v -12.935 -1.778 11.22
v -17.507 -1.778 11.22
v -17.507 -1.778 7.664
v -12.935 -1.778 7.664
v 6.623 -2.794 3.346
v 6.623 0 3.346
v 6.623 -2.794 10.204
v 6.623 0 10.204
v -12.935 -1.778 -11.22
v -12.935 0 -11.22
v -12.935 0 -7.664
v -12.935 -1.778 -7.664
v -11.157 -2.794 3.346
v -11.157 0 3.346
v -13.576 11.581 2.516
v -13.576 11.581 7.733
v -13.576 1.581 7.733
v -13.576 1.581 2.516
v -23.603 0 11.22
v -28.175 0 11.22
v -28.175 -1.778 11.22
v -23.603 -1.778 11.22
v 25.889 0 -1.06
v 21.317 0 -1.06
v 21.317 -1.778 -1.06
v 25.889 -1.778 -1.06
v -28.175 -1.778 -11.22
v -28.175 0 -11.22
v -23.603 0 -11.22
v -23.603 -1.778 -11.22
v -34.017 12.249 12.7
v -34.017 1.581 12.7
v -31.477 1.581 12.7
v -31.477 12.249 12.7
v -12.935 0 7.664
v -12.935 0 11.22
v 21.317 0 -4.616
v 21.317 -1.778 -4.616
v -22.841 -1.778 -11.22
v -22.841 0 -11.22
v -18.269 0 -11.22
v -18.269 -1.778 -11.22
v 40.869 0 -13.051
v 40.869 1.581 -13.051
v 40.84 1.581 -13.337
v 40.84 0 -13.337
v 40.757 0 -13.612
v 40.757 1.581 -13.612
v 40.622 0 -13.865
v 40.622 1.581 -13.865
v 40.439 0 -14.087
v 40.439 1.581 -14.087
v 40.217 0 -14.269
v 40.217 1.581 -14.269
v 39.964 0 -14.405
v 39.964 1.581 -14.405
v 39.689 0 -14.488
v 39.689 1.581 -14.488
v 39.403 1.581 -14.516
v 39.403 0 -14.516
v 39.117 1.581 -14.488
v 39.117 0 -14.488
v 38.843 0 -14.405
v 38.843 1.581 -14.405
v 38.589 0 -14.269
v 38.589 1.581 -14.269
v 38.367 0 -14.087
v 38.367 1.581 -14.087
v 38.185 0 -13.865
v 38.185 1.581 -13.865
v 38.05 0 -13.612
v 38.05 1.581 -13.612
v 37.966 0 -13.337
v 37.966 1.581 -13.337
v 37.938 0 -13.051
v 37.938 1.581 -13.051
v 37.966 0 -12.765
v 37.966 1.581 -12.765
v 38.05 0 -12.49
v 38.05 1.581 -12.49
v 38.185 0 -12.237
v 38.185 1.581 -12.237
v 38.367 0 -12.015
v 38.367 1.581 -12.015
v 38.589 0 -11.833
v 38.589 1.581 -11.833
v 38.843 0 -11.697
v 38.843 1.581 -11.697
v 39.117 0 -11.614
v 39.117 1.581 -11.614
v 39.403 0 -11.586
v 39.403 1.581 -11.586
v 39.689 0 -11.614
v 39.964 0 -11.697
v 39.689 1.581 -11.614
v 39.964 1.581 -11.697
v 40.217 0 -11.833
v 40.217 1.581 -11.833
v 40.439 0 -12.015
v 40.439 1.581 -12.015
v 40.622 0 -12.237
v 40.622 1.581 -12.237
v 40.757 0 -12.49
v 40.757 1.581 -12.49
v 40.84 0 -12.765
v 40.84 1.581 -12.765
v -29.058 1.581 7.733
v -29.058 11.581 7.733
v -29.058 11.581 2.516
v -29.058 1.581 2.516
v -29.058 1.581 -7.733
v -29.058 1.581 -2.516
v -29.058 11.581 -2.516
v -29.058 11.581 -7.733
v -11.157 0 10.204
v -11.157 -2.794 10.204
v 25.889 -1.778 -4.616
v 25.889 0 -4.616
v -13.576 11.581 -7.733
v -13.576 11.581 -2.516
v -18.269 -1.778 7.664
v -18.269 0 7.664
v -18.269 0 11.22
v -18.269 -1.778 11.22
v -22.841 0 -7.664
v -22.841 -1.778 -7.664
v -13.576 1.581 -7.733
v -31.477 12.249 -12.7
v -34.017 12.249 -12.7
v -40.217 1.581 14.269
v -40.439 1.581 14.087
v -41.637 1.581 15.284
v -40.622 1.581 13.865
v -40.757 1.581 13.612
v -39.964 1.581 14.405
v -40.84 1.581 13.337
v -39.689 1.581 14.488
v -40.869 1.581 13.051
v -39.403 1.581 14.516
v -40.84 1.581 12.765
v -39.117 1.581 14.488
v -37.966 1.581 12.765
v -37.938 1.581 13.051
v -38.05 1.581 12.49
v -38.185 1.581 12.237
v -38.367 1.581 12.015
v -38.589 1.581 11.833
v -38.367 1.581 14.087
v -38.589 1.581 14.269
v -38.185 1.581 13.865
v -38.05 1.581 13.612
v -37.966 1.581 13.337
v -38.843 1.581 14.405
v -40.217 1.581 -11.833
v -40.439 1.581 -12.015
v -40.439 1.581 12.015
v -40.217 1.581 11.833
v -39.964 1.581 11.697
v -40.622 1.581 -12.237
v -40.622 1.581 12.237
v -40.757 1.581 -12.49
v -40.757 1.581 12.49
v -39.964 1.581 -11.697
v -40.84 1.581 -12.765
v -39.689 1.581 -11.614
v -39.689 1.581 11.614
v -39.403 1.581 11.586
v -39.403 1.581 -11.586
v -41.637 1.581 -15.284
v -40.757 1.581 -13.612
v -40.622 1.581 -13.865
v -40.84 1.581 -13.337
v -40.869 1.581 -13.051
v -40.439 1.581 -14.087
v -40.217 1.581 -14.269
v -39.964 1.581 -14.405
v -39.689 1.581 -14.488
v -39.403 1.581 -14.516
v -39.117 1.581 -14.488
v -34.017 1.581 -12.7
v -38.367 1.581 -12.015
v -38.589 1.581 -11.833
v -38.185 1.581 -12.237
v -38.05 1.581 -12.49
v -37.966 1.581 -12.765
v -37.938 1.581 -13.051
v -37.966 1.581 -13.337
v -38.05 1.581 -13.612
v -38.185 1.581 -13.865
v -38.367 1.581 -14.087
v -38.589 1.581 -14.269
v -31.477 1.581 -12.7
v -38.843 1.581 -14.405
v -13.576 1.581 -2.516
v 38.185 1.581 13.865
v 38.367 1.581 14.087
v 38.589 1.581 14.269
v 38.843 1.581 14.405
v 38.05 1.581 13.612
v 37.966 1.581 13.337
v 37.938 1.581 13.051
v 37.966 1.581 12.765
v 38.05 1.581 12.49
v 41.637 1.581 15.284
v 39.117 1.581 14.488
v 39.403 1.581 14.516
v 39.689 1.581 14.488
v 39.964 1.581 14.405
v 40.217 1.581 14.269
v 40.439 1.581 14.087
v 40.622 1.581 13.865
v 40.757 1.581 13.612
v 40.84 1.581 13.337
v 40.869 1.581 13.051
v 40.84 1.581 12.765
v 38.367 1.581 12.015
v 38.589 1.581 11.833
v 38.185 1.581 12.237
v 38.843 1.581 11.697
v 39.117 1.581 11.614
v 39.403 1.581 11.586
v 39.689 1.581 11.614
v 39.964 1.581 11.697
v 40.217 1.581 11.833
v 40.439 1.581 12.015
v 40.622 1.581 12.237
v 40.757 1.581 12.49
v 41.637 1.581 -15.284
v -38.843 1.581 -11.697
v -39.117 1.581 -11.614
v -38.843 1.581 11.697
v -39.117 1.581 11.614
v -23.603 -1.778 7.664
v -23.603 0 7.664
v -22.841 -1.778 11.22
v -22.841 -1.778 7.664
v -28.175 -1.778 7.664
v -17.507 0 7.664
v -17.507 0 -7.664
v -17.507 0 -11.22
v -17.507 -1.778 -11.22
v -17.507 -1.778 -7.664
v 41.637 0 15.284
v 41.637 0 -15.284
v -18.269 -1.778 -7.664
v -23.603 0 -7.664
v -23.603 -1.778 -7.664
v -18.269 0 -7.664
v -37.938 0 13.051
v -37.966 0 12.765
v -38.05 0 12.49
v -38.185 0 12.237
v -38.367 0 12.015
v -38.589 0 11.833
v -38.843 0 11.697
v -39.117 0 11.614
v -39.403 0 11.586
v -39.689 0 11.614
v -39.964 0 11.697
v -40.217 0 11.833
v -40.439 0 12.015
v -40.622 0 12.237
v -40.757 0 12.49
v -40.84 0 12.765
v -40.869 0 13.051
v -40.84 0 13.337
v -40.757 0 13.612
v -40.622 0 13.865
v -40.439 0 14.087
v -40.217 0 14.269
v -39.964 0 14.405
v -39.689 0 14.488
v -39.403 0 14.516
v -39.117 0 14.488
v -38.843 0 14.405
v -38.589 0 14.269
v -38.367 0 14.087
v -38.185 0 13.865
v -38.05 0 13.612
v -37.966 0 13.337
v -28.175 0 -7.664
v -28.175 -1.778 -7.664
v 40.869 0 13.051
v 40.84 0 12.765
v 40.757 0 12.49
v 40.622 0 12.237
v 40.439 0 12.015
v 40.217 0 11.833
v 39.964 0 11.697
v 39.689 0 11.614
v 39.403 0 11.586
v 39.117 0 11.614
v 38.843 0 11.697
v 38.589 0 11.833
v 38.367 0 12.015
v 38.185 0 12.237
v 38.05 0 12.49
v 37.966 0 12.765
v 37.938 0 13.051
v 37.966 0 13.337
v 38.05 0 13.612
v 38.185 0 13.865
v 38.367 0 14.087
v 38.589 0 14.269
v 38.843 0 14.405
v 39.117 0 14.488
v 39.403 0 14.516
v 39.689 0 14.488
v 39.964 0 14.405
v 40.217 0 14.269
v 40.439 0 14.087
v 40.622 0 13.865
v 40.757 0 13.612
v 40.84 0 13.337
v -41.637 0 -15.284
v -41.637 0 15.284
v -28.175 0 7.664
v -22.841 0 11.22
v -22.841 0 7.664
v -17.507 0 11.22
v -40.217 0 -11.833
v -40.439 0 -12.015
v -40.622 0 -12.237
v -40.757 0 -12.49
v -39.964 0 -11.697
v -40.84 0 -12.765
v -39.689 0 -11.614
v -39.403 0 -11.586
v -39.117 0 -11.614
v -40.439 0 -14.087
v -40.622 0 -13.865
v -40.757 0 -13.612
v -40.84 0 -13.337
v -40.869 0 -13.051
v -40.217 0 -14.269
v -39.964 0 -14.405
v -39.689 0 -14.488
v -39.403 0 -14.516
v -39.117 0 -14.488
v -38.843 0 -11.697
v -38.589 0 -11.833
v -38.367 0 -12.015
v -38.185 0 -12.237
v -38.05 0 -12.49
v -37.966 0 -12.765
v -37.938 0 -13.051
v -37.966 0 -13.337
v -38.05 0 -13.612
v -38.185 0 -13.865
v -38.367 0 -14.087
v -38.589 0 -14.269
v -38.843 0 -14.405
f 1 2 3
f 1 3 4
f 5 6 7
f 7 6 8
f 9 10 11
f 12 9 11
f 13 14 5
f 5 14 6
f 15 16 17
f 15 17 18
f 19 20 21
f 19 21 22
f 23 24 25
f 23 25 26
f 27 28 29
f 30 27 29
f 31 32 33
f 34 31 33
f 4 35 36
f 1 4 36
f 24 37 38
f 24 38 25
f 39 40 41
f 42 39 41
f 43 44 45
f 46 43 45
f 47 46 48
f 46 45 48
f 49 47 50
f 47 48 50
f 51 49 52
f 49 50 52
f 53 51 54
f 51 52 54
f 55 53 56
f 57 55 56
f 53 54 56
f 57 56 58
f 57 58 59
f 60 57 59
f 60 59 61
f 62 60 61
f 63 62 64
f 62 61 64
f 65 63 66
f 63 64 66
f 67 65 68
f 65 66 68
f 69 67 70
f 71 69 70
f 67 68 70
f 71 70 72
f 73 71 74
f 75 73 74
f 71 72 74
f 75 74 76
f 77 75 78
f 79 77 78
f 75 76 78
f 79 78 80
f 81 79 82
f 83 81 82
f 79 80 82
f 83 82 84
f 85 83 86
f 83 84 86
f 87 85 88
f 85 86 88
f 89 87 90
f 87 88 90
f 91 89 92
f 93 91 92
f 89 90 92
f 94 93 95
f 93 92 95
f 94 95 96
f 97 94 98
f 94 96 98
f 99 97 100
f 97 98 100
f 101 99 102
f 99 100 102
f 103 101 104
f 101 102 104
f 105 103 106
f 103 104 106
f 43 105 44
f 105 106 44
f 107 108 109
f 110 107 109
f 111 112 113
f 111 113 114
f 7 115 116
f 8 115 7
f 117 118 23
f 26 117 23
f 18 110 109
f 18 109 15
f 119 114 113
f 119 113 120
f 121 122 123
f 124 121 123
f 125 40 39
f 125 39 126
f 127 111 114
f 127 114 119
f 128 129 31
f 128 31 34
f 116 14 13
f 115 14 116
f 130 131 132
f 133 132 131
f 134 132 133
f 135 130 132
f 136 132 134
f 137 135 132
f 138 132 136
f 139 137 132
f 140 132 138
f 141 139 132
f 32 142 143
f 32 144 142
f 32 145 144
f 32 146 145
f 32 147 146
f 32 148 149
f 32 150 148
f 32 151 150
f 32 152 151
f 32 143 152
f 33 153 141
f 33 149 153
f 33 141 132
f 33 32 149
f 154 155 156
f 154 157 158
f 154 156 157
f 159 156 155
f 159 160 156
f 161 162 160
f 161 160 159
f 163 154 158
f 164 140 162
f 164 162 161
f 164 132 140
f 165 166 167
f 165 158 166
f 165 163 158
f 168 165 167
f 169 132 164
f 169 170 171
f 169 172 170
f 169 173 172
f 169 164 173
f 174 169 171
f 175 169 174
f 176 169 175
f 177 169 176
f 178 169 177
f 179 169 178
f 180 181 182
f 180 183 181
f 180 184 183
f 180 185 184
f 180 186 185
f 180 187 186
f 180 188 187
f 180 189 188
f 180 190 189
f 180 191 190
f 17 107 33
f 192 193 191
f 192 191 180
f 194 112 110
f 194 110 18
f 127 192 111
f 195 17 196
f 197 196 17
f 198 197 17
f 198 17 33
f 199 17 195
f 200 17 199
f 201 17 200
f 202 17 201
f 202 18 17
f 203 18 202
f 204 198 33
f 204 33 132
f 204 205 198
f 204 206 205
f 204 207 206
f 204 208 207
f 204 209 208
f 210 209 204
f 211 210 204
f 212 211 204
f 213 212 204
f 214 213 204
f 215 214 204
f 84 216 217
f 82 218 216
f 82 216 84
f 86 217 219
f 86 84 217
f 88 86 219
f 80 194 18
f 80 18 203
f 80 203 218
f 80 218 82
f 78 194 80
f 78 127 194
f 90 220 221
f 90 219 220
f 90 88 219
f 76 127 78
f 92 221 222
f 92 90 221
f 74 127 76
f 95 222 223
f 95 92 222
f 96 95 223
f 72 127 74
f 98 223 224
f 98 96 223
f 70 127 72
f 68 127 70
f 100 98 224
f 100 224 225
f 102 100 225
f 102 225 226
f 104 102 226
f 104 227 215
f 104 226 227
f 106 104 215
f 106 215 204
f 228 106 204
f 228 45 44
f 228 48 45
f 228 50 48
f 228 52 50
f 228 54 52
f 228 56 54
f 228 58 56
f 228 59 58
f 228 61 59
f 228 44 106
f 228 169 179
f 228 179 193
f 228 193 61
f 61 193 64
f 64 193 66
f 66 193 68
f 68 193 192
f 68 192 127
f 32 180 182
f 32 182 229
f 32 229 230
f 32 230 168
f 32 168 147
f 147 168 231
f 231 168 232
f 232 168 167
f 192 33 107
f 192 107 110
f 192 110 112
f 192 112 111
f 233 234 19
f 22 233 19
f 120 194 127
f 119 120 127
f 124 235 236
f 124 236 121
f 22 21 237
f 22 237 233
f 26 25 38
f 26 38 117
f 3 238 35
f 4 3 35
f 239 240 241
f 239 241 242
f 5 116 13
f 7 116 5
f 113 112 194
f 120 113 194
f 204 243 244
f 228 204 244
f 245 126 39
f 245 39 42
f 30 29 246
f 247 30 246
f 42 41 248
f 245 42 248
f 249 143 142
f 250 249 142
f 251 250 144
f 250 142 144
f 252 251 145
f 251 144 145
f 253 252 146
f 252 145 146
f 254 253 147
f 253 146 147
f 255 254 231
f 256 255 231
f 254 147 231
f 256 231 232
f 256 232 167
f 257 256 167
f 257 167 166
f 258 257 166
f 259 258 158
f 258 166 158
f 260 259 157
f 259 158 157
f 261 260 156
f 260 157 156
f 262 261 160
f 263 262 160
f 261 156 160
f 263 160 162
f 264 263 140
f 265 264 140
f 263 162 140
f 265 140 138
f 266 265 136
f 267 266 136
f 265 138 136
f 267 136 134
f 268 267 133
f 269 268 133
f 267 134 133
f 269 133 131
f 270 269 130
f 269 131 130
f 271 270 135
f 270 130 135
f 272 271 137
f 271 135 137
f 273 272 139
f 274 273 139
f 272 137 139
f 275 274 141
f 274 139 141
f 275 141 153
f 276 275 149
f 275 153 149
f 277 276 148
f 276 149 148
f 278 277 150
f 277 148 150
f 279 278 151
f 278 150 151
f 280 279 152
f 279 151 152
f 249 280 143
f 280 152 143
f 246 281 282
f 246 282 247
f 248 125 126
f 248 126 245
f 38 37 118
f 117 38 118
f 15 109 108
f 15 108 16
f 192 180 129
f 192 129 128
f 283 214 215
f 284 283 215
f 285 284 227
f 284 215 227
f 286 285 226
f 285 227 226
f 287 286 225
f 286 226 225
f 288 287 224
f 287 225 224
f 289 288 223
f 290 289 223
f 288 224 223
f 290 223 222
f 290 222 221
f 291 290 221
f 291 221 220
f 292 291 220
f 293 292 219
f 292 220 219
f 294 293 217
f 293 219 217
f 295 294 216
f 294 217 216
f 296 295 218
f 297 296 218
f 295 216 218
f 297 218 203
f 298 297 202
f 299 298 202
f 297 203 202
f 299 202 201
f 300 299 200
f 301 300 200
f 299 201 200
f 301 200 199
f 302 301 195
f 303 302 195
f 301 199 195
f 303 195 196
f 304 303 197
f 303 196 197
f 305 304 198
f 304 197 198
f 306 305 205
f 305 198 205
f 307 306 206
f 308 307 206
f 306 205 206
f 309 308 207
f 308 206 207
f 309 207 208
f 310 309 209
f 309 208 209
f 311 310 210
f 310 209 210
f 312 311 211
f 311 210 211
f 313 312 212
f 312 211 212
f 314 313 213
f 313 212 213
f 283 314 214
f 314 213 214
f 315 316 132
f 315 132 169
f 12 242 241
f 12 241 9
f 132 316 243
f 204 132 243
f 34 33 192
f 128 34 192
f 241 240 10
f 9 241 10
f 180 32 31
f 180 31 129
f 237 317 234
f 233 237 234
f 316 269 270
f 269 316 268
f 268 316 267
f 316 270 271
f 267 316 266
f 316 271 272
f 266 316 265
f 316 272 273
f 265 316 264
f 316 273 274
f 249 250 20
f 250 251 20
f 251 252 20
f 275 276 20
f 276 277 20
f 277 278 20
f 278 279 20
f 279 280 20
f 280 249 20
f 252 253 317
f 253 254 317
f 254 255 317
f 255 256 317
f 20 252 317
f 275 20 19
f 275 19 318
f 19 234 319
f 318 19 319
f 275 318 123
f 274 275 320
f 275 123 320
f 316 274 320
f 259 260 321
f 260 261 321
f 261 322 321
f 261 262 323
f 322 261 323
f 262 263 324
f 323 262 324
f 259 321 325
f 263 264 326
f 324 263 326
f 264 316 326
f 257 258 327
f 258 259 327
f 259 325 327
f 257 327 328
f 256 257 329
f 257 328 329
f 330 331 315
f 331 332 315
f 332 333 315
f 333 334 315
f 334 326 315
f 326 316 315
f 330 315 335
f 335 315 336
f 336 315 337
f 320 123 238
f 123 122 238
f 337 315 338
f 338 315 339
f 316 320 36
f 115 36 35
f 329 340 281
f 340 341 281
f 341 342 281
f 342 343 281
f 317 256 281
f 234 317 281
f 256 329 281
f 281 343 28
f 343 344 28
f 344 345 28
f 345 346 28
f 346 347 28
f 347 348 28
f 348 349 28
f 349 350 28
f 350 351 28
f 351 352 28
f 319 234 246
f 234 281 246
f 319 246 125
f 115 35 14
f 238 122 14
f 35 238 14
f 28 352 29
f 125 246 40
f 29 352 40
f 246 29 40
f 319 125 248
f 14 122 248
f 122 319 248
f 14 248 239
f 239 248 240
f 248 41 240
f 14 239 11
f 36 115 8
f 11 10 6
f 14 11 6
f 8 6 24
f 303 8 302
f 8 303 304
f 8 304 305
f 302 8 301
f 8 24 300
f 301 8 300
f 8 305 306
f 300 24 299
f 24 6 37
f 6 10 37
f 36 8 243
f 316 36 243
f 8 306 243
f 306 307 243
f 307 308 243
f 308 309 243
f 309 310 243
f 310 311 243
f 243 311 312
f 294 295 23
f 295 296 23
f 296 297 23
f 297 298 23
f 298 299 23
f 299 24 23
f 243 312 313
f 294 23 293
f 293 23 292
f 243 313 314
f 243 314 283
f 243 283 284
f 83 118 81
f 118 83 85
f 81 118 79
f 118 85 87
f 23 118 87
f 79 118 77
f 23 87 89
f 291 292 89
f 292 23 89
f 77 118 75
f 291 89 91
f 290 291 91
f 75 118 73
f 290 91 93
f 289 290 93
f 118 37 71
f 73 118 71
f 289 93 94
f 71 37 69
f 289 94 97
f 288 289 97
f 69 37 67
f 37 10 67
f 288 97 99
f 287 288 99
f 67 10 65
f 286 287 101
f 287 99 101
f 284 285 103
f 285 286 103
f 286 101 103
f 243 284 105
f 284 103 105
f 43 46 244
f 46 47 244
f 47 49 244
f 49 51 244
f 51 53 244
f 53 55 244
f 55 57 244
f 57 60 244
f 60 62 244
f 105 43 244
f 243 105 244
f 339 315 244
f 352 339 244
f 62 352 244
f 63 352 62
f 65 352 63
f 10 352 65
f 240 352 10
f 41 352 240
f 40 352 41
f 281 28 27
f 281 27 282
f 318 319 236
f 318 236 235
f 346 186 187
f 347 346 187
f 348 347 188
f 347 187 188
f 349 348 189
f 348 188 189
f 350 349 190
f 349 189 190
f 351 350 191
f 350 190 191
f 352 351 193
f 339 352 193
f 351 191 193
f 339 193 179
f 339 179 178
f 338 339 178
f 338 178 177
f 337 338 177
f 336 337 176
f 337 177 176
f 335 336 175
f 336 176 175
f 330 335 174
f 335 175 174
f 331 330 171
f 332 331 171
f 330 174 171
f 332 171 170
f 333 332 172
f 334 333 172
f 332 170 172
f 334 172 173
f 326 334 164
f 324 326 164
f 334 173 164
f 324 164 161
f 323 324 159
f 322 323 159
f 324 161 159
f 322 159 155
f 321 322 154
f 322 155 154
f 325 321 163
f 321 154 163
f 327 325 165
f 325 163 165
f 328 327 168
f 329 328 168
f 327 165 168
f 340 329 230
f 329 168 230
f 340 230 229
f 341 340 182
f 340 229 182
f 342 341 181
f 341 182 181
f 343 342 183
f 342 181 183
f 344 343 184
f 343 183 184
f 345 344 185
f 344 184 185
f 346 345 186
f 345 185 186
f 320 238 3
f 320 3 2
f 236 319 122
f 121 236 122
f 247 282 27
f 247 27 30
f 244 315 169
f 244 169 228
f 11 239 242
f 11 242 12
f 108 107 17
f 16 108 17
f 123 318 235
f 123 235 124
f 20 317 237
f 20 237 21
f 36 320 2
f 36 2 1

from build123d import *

# Parameters (mm, degrees)
SKETCH1_W                  = 83.2739
SKETCH1_H                  = 30.5689
PROTON_PCB_DEPTH           = 1.58115
SKETCH2_W                  = 15.481187868
SKETCH2_H                  = 5.216136306
JST_6_PIN_CONNECTORS_DEPTH = 10
SKETCH3_W                  = 2.54
SKETCH3_H                  = 25.4
BOSS_EXTRUDE1_DEPTH        = 10.668
SKETCH4_R                  = 1.4652625
CUT_EXTRUDE1_DEPTH         = 1.58115
SKETCH5_W                  = 4.572
SKETCH5_H                  = 3.556
BOSS_EXTRUDE2_DEPTH        = 1.778
SKETCH6_W                  = 17.78
SKETCH6_H                  = 6.858
BOSS_EXTRUDE3_DEPTH        = 2.794


with BuildPart() as part:
    # Sketch1 → Proton PCB (new body)
    with BuildSketch(Plane(origin=(0, 0, 0), x_dir=(1, 0, 0), z_dir=(0, 1, 0))):
        Rectangle(SKETCH1_W, SKETCH1_H)
    extrude(amount=PROTON_PCB_DEPTH)

    # Sketch2 → JST 6 pin Connectors (add)
    with BuildSketch(Plane(origin=(0, 1.58115, 0), x_dir=(1, 0, 0), z_dir=(0, 1, 0))):
        with Locations((-21.31695, 5.12445)):
            Rectangle(SKETCH2_W, SKETCH2_H)
        with Locations((-21.31695, -5.12445)):
            Rectangle(SKETCH2_W, SKETCH2_H)
    extrude(amount=JST_6_PIN_CONNECTORS_DEPTH)

    # Sketch3 → Boss-Extrude1 (add)
    with BuildSketch(Plane(origin=(0, 1.58115, 0), x_dir=(1, 0, 0), z_dir=(0, 1, 0))):
        with Locations((-32.74695, 0)):
            Rectangle(SKETCH3_W, SKETCH3_H)
    extrude(amount=BOSS_EXTRUDE1_DEPTH)

    # Sketch4 → Cut-Extrude1 (cut)
    with BuildSketch(Plane(origin=(0, 1.58115, 0), x_dir=(1, 0, 0), z_dir=(0, 1, 0))):
        with Locations((-39.4033375, 13.0508375)):
            Circle(SKETCH4_R)
        with Locations((39.4033375, 13.0508375)):
            Circle(SKETCH4_R)
        with Locations((-39.4033375, -13.0508375)):
            Circle(SKETCH4_R)
        with Locations((39.4033375, -13.0508375)):
            Circle(SKETCH4_R)
    extrude(amount=-CUT_EXTRUDE1_DEPTH, mode=Mode.SUBTRACT)

    # Sketch5 → Boss-Extrude2 (add)
    with BuildSketch(Plane.XZ):
        with Locations((-20.55495, 9.44245)):
            Rectangle(SKETCH5_W, SKETCH5_H)
        with Locations((-25.88895, 9.44245)):
            Rectangle(SKETCH5_W, SKETCH5_H)
        with Locations((-15.22095, 9.44245)):
            Rectangle(SKETCH5_W, SKETCH5_H)
        with Locations((23.60295, -2.83845)):
            Rectangle(SKETCH5_W, SKETCH5_H)
        with Locations((-15.22095, -9.44245)):
            Rectangle(SKETCH5_W, SKETCH5_H)
        with Locations((-20.55495, -9.44245)):
            Rectangle(SKETCH5_W, SKETCH5_H)
        with Locations((-25.88895, -9.44245)):
            Rectangle(SKETCH5_W, SKETCH5_H)
    extrude(amount=BOSS_EXTRUDE2_DEPTH)

    # Sketch6 → Boss-Extrude3 (add)
    with BuildSketch(Plane.XZ):
        with Locations((-2.26695, 6.77545)):
            Rectangle(SKETCH6_W, SKETCH6_H)
    extrude(amount=BOSS_EXTRUDE3_DEPTH)


solid = part.part
